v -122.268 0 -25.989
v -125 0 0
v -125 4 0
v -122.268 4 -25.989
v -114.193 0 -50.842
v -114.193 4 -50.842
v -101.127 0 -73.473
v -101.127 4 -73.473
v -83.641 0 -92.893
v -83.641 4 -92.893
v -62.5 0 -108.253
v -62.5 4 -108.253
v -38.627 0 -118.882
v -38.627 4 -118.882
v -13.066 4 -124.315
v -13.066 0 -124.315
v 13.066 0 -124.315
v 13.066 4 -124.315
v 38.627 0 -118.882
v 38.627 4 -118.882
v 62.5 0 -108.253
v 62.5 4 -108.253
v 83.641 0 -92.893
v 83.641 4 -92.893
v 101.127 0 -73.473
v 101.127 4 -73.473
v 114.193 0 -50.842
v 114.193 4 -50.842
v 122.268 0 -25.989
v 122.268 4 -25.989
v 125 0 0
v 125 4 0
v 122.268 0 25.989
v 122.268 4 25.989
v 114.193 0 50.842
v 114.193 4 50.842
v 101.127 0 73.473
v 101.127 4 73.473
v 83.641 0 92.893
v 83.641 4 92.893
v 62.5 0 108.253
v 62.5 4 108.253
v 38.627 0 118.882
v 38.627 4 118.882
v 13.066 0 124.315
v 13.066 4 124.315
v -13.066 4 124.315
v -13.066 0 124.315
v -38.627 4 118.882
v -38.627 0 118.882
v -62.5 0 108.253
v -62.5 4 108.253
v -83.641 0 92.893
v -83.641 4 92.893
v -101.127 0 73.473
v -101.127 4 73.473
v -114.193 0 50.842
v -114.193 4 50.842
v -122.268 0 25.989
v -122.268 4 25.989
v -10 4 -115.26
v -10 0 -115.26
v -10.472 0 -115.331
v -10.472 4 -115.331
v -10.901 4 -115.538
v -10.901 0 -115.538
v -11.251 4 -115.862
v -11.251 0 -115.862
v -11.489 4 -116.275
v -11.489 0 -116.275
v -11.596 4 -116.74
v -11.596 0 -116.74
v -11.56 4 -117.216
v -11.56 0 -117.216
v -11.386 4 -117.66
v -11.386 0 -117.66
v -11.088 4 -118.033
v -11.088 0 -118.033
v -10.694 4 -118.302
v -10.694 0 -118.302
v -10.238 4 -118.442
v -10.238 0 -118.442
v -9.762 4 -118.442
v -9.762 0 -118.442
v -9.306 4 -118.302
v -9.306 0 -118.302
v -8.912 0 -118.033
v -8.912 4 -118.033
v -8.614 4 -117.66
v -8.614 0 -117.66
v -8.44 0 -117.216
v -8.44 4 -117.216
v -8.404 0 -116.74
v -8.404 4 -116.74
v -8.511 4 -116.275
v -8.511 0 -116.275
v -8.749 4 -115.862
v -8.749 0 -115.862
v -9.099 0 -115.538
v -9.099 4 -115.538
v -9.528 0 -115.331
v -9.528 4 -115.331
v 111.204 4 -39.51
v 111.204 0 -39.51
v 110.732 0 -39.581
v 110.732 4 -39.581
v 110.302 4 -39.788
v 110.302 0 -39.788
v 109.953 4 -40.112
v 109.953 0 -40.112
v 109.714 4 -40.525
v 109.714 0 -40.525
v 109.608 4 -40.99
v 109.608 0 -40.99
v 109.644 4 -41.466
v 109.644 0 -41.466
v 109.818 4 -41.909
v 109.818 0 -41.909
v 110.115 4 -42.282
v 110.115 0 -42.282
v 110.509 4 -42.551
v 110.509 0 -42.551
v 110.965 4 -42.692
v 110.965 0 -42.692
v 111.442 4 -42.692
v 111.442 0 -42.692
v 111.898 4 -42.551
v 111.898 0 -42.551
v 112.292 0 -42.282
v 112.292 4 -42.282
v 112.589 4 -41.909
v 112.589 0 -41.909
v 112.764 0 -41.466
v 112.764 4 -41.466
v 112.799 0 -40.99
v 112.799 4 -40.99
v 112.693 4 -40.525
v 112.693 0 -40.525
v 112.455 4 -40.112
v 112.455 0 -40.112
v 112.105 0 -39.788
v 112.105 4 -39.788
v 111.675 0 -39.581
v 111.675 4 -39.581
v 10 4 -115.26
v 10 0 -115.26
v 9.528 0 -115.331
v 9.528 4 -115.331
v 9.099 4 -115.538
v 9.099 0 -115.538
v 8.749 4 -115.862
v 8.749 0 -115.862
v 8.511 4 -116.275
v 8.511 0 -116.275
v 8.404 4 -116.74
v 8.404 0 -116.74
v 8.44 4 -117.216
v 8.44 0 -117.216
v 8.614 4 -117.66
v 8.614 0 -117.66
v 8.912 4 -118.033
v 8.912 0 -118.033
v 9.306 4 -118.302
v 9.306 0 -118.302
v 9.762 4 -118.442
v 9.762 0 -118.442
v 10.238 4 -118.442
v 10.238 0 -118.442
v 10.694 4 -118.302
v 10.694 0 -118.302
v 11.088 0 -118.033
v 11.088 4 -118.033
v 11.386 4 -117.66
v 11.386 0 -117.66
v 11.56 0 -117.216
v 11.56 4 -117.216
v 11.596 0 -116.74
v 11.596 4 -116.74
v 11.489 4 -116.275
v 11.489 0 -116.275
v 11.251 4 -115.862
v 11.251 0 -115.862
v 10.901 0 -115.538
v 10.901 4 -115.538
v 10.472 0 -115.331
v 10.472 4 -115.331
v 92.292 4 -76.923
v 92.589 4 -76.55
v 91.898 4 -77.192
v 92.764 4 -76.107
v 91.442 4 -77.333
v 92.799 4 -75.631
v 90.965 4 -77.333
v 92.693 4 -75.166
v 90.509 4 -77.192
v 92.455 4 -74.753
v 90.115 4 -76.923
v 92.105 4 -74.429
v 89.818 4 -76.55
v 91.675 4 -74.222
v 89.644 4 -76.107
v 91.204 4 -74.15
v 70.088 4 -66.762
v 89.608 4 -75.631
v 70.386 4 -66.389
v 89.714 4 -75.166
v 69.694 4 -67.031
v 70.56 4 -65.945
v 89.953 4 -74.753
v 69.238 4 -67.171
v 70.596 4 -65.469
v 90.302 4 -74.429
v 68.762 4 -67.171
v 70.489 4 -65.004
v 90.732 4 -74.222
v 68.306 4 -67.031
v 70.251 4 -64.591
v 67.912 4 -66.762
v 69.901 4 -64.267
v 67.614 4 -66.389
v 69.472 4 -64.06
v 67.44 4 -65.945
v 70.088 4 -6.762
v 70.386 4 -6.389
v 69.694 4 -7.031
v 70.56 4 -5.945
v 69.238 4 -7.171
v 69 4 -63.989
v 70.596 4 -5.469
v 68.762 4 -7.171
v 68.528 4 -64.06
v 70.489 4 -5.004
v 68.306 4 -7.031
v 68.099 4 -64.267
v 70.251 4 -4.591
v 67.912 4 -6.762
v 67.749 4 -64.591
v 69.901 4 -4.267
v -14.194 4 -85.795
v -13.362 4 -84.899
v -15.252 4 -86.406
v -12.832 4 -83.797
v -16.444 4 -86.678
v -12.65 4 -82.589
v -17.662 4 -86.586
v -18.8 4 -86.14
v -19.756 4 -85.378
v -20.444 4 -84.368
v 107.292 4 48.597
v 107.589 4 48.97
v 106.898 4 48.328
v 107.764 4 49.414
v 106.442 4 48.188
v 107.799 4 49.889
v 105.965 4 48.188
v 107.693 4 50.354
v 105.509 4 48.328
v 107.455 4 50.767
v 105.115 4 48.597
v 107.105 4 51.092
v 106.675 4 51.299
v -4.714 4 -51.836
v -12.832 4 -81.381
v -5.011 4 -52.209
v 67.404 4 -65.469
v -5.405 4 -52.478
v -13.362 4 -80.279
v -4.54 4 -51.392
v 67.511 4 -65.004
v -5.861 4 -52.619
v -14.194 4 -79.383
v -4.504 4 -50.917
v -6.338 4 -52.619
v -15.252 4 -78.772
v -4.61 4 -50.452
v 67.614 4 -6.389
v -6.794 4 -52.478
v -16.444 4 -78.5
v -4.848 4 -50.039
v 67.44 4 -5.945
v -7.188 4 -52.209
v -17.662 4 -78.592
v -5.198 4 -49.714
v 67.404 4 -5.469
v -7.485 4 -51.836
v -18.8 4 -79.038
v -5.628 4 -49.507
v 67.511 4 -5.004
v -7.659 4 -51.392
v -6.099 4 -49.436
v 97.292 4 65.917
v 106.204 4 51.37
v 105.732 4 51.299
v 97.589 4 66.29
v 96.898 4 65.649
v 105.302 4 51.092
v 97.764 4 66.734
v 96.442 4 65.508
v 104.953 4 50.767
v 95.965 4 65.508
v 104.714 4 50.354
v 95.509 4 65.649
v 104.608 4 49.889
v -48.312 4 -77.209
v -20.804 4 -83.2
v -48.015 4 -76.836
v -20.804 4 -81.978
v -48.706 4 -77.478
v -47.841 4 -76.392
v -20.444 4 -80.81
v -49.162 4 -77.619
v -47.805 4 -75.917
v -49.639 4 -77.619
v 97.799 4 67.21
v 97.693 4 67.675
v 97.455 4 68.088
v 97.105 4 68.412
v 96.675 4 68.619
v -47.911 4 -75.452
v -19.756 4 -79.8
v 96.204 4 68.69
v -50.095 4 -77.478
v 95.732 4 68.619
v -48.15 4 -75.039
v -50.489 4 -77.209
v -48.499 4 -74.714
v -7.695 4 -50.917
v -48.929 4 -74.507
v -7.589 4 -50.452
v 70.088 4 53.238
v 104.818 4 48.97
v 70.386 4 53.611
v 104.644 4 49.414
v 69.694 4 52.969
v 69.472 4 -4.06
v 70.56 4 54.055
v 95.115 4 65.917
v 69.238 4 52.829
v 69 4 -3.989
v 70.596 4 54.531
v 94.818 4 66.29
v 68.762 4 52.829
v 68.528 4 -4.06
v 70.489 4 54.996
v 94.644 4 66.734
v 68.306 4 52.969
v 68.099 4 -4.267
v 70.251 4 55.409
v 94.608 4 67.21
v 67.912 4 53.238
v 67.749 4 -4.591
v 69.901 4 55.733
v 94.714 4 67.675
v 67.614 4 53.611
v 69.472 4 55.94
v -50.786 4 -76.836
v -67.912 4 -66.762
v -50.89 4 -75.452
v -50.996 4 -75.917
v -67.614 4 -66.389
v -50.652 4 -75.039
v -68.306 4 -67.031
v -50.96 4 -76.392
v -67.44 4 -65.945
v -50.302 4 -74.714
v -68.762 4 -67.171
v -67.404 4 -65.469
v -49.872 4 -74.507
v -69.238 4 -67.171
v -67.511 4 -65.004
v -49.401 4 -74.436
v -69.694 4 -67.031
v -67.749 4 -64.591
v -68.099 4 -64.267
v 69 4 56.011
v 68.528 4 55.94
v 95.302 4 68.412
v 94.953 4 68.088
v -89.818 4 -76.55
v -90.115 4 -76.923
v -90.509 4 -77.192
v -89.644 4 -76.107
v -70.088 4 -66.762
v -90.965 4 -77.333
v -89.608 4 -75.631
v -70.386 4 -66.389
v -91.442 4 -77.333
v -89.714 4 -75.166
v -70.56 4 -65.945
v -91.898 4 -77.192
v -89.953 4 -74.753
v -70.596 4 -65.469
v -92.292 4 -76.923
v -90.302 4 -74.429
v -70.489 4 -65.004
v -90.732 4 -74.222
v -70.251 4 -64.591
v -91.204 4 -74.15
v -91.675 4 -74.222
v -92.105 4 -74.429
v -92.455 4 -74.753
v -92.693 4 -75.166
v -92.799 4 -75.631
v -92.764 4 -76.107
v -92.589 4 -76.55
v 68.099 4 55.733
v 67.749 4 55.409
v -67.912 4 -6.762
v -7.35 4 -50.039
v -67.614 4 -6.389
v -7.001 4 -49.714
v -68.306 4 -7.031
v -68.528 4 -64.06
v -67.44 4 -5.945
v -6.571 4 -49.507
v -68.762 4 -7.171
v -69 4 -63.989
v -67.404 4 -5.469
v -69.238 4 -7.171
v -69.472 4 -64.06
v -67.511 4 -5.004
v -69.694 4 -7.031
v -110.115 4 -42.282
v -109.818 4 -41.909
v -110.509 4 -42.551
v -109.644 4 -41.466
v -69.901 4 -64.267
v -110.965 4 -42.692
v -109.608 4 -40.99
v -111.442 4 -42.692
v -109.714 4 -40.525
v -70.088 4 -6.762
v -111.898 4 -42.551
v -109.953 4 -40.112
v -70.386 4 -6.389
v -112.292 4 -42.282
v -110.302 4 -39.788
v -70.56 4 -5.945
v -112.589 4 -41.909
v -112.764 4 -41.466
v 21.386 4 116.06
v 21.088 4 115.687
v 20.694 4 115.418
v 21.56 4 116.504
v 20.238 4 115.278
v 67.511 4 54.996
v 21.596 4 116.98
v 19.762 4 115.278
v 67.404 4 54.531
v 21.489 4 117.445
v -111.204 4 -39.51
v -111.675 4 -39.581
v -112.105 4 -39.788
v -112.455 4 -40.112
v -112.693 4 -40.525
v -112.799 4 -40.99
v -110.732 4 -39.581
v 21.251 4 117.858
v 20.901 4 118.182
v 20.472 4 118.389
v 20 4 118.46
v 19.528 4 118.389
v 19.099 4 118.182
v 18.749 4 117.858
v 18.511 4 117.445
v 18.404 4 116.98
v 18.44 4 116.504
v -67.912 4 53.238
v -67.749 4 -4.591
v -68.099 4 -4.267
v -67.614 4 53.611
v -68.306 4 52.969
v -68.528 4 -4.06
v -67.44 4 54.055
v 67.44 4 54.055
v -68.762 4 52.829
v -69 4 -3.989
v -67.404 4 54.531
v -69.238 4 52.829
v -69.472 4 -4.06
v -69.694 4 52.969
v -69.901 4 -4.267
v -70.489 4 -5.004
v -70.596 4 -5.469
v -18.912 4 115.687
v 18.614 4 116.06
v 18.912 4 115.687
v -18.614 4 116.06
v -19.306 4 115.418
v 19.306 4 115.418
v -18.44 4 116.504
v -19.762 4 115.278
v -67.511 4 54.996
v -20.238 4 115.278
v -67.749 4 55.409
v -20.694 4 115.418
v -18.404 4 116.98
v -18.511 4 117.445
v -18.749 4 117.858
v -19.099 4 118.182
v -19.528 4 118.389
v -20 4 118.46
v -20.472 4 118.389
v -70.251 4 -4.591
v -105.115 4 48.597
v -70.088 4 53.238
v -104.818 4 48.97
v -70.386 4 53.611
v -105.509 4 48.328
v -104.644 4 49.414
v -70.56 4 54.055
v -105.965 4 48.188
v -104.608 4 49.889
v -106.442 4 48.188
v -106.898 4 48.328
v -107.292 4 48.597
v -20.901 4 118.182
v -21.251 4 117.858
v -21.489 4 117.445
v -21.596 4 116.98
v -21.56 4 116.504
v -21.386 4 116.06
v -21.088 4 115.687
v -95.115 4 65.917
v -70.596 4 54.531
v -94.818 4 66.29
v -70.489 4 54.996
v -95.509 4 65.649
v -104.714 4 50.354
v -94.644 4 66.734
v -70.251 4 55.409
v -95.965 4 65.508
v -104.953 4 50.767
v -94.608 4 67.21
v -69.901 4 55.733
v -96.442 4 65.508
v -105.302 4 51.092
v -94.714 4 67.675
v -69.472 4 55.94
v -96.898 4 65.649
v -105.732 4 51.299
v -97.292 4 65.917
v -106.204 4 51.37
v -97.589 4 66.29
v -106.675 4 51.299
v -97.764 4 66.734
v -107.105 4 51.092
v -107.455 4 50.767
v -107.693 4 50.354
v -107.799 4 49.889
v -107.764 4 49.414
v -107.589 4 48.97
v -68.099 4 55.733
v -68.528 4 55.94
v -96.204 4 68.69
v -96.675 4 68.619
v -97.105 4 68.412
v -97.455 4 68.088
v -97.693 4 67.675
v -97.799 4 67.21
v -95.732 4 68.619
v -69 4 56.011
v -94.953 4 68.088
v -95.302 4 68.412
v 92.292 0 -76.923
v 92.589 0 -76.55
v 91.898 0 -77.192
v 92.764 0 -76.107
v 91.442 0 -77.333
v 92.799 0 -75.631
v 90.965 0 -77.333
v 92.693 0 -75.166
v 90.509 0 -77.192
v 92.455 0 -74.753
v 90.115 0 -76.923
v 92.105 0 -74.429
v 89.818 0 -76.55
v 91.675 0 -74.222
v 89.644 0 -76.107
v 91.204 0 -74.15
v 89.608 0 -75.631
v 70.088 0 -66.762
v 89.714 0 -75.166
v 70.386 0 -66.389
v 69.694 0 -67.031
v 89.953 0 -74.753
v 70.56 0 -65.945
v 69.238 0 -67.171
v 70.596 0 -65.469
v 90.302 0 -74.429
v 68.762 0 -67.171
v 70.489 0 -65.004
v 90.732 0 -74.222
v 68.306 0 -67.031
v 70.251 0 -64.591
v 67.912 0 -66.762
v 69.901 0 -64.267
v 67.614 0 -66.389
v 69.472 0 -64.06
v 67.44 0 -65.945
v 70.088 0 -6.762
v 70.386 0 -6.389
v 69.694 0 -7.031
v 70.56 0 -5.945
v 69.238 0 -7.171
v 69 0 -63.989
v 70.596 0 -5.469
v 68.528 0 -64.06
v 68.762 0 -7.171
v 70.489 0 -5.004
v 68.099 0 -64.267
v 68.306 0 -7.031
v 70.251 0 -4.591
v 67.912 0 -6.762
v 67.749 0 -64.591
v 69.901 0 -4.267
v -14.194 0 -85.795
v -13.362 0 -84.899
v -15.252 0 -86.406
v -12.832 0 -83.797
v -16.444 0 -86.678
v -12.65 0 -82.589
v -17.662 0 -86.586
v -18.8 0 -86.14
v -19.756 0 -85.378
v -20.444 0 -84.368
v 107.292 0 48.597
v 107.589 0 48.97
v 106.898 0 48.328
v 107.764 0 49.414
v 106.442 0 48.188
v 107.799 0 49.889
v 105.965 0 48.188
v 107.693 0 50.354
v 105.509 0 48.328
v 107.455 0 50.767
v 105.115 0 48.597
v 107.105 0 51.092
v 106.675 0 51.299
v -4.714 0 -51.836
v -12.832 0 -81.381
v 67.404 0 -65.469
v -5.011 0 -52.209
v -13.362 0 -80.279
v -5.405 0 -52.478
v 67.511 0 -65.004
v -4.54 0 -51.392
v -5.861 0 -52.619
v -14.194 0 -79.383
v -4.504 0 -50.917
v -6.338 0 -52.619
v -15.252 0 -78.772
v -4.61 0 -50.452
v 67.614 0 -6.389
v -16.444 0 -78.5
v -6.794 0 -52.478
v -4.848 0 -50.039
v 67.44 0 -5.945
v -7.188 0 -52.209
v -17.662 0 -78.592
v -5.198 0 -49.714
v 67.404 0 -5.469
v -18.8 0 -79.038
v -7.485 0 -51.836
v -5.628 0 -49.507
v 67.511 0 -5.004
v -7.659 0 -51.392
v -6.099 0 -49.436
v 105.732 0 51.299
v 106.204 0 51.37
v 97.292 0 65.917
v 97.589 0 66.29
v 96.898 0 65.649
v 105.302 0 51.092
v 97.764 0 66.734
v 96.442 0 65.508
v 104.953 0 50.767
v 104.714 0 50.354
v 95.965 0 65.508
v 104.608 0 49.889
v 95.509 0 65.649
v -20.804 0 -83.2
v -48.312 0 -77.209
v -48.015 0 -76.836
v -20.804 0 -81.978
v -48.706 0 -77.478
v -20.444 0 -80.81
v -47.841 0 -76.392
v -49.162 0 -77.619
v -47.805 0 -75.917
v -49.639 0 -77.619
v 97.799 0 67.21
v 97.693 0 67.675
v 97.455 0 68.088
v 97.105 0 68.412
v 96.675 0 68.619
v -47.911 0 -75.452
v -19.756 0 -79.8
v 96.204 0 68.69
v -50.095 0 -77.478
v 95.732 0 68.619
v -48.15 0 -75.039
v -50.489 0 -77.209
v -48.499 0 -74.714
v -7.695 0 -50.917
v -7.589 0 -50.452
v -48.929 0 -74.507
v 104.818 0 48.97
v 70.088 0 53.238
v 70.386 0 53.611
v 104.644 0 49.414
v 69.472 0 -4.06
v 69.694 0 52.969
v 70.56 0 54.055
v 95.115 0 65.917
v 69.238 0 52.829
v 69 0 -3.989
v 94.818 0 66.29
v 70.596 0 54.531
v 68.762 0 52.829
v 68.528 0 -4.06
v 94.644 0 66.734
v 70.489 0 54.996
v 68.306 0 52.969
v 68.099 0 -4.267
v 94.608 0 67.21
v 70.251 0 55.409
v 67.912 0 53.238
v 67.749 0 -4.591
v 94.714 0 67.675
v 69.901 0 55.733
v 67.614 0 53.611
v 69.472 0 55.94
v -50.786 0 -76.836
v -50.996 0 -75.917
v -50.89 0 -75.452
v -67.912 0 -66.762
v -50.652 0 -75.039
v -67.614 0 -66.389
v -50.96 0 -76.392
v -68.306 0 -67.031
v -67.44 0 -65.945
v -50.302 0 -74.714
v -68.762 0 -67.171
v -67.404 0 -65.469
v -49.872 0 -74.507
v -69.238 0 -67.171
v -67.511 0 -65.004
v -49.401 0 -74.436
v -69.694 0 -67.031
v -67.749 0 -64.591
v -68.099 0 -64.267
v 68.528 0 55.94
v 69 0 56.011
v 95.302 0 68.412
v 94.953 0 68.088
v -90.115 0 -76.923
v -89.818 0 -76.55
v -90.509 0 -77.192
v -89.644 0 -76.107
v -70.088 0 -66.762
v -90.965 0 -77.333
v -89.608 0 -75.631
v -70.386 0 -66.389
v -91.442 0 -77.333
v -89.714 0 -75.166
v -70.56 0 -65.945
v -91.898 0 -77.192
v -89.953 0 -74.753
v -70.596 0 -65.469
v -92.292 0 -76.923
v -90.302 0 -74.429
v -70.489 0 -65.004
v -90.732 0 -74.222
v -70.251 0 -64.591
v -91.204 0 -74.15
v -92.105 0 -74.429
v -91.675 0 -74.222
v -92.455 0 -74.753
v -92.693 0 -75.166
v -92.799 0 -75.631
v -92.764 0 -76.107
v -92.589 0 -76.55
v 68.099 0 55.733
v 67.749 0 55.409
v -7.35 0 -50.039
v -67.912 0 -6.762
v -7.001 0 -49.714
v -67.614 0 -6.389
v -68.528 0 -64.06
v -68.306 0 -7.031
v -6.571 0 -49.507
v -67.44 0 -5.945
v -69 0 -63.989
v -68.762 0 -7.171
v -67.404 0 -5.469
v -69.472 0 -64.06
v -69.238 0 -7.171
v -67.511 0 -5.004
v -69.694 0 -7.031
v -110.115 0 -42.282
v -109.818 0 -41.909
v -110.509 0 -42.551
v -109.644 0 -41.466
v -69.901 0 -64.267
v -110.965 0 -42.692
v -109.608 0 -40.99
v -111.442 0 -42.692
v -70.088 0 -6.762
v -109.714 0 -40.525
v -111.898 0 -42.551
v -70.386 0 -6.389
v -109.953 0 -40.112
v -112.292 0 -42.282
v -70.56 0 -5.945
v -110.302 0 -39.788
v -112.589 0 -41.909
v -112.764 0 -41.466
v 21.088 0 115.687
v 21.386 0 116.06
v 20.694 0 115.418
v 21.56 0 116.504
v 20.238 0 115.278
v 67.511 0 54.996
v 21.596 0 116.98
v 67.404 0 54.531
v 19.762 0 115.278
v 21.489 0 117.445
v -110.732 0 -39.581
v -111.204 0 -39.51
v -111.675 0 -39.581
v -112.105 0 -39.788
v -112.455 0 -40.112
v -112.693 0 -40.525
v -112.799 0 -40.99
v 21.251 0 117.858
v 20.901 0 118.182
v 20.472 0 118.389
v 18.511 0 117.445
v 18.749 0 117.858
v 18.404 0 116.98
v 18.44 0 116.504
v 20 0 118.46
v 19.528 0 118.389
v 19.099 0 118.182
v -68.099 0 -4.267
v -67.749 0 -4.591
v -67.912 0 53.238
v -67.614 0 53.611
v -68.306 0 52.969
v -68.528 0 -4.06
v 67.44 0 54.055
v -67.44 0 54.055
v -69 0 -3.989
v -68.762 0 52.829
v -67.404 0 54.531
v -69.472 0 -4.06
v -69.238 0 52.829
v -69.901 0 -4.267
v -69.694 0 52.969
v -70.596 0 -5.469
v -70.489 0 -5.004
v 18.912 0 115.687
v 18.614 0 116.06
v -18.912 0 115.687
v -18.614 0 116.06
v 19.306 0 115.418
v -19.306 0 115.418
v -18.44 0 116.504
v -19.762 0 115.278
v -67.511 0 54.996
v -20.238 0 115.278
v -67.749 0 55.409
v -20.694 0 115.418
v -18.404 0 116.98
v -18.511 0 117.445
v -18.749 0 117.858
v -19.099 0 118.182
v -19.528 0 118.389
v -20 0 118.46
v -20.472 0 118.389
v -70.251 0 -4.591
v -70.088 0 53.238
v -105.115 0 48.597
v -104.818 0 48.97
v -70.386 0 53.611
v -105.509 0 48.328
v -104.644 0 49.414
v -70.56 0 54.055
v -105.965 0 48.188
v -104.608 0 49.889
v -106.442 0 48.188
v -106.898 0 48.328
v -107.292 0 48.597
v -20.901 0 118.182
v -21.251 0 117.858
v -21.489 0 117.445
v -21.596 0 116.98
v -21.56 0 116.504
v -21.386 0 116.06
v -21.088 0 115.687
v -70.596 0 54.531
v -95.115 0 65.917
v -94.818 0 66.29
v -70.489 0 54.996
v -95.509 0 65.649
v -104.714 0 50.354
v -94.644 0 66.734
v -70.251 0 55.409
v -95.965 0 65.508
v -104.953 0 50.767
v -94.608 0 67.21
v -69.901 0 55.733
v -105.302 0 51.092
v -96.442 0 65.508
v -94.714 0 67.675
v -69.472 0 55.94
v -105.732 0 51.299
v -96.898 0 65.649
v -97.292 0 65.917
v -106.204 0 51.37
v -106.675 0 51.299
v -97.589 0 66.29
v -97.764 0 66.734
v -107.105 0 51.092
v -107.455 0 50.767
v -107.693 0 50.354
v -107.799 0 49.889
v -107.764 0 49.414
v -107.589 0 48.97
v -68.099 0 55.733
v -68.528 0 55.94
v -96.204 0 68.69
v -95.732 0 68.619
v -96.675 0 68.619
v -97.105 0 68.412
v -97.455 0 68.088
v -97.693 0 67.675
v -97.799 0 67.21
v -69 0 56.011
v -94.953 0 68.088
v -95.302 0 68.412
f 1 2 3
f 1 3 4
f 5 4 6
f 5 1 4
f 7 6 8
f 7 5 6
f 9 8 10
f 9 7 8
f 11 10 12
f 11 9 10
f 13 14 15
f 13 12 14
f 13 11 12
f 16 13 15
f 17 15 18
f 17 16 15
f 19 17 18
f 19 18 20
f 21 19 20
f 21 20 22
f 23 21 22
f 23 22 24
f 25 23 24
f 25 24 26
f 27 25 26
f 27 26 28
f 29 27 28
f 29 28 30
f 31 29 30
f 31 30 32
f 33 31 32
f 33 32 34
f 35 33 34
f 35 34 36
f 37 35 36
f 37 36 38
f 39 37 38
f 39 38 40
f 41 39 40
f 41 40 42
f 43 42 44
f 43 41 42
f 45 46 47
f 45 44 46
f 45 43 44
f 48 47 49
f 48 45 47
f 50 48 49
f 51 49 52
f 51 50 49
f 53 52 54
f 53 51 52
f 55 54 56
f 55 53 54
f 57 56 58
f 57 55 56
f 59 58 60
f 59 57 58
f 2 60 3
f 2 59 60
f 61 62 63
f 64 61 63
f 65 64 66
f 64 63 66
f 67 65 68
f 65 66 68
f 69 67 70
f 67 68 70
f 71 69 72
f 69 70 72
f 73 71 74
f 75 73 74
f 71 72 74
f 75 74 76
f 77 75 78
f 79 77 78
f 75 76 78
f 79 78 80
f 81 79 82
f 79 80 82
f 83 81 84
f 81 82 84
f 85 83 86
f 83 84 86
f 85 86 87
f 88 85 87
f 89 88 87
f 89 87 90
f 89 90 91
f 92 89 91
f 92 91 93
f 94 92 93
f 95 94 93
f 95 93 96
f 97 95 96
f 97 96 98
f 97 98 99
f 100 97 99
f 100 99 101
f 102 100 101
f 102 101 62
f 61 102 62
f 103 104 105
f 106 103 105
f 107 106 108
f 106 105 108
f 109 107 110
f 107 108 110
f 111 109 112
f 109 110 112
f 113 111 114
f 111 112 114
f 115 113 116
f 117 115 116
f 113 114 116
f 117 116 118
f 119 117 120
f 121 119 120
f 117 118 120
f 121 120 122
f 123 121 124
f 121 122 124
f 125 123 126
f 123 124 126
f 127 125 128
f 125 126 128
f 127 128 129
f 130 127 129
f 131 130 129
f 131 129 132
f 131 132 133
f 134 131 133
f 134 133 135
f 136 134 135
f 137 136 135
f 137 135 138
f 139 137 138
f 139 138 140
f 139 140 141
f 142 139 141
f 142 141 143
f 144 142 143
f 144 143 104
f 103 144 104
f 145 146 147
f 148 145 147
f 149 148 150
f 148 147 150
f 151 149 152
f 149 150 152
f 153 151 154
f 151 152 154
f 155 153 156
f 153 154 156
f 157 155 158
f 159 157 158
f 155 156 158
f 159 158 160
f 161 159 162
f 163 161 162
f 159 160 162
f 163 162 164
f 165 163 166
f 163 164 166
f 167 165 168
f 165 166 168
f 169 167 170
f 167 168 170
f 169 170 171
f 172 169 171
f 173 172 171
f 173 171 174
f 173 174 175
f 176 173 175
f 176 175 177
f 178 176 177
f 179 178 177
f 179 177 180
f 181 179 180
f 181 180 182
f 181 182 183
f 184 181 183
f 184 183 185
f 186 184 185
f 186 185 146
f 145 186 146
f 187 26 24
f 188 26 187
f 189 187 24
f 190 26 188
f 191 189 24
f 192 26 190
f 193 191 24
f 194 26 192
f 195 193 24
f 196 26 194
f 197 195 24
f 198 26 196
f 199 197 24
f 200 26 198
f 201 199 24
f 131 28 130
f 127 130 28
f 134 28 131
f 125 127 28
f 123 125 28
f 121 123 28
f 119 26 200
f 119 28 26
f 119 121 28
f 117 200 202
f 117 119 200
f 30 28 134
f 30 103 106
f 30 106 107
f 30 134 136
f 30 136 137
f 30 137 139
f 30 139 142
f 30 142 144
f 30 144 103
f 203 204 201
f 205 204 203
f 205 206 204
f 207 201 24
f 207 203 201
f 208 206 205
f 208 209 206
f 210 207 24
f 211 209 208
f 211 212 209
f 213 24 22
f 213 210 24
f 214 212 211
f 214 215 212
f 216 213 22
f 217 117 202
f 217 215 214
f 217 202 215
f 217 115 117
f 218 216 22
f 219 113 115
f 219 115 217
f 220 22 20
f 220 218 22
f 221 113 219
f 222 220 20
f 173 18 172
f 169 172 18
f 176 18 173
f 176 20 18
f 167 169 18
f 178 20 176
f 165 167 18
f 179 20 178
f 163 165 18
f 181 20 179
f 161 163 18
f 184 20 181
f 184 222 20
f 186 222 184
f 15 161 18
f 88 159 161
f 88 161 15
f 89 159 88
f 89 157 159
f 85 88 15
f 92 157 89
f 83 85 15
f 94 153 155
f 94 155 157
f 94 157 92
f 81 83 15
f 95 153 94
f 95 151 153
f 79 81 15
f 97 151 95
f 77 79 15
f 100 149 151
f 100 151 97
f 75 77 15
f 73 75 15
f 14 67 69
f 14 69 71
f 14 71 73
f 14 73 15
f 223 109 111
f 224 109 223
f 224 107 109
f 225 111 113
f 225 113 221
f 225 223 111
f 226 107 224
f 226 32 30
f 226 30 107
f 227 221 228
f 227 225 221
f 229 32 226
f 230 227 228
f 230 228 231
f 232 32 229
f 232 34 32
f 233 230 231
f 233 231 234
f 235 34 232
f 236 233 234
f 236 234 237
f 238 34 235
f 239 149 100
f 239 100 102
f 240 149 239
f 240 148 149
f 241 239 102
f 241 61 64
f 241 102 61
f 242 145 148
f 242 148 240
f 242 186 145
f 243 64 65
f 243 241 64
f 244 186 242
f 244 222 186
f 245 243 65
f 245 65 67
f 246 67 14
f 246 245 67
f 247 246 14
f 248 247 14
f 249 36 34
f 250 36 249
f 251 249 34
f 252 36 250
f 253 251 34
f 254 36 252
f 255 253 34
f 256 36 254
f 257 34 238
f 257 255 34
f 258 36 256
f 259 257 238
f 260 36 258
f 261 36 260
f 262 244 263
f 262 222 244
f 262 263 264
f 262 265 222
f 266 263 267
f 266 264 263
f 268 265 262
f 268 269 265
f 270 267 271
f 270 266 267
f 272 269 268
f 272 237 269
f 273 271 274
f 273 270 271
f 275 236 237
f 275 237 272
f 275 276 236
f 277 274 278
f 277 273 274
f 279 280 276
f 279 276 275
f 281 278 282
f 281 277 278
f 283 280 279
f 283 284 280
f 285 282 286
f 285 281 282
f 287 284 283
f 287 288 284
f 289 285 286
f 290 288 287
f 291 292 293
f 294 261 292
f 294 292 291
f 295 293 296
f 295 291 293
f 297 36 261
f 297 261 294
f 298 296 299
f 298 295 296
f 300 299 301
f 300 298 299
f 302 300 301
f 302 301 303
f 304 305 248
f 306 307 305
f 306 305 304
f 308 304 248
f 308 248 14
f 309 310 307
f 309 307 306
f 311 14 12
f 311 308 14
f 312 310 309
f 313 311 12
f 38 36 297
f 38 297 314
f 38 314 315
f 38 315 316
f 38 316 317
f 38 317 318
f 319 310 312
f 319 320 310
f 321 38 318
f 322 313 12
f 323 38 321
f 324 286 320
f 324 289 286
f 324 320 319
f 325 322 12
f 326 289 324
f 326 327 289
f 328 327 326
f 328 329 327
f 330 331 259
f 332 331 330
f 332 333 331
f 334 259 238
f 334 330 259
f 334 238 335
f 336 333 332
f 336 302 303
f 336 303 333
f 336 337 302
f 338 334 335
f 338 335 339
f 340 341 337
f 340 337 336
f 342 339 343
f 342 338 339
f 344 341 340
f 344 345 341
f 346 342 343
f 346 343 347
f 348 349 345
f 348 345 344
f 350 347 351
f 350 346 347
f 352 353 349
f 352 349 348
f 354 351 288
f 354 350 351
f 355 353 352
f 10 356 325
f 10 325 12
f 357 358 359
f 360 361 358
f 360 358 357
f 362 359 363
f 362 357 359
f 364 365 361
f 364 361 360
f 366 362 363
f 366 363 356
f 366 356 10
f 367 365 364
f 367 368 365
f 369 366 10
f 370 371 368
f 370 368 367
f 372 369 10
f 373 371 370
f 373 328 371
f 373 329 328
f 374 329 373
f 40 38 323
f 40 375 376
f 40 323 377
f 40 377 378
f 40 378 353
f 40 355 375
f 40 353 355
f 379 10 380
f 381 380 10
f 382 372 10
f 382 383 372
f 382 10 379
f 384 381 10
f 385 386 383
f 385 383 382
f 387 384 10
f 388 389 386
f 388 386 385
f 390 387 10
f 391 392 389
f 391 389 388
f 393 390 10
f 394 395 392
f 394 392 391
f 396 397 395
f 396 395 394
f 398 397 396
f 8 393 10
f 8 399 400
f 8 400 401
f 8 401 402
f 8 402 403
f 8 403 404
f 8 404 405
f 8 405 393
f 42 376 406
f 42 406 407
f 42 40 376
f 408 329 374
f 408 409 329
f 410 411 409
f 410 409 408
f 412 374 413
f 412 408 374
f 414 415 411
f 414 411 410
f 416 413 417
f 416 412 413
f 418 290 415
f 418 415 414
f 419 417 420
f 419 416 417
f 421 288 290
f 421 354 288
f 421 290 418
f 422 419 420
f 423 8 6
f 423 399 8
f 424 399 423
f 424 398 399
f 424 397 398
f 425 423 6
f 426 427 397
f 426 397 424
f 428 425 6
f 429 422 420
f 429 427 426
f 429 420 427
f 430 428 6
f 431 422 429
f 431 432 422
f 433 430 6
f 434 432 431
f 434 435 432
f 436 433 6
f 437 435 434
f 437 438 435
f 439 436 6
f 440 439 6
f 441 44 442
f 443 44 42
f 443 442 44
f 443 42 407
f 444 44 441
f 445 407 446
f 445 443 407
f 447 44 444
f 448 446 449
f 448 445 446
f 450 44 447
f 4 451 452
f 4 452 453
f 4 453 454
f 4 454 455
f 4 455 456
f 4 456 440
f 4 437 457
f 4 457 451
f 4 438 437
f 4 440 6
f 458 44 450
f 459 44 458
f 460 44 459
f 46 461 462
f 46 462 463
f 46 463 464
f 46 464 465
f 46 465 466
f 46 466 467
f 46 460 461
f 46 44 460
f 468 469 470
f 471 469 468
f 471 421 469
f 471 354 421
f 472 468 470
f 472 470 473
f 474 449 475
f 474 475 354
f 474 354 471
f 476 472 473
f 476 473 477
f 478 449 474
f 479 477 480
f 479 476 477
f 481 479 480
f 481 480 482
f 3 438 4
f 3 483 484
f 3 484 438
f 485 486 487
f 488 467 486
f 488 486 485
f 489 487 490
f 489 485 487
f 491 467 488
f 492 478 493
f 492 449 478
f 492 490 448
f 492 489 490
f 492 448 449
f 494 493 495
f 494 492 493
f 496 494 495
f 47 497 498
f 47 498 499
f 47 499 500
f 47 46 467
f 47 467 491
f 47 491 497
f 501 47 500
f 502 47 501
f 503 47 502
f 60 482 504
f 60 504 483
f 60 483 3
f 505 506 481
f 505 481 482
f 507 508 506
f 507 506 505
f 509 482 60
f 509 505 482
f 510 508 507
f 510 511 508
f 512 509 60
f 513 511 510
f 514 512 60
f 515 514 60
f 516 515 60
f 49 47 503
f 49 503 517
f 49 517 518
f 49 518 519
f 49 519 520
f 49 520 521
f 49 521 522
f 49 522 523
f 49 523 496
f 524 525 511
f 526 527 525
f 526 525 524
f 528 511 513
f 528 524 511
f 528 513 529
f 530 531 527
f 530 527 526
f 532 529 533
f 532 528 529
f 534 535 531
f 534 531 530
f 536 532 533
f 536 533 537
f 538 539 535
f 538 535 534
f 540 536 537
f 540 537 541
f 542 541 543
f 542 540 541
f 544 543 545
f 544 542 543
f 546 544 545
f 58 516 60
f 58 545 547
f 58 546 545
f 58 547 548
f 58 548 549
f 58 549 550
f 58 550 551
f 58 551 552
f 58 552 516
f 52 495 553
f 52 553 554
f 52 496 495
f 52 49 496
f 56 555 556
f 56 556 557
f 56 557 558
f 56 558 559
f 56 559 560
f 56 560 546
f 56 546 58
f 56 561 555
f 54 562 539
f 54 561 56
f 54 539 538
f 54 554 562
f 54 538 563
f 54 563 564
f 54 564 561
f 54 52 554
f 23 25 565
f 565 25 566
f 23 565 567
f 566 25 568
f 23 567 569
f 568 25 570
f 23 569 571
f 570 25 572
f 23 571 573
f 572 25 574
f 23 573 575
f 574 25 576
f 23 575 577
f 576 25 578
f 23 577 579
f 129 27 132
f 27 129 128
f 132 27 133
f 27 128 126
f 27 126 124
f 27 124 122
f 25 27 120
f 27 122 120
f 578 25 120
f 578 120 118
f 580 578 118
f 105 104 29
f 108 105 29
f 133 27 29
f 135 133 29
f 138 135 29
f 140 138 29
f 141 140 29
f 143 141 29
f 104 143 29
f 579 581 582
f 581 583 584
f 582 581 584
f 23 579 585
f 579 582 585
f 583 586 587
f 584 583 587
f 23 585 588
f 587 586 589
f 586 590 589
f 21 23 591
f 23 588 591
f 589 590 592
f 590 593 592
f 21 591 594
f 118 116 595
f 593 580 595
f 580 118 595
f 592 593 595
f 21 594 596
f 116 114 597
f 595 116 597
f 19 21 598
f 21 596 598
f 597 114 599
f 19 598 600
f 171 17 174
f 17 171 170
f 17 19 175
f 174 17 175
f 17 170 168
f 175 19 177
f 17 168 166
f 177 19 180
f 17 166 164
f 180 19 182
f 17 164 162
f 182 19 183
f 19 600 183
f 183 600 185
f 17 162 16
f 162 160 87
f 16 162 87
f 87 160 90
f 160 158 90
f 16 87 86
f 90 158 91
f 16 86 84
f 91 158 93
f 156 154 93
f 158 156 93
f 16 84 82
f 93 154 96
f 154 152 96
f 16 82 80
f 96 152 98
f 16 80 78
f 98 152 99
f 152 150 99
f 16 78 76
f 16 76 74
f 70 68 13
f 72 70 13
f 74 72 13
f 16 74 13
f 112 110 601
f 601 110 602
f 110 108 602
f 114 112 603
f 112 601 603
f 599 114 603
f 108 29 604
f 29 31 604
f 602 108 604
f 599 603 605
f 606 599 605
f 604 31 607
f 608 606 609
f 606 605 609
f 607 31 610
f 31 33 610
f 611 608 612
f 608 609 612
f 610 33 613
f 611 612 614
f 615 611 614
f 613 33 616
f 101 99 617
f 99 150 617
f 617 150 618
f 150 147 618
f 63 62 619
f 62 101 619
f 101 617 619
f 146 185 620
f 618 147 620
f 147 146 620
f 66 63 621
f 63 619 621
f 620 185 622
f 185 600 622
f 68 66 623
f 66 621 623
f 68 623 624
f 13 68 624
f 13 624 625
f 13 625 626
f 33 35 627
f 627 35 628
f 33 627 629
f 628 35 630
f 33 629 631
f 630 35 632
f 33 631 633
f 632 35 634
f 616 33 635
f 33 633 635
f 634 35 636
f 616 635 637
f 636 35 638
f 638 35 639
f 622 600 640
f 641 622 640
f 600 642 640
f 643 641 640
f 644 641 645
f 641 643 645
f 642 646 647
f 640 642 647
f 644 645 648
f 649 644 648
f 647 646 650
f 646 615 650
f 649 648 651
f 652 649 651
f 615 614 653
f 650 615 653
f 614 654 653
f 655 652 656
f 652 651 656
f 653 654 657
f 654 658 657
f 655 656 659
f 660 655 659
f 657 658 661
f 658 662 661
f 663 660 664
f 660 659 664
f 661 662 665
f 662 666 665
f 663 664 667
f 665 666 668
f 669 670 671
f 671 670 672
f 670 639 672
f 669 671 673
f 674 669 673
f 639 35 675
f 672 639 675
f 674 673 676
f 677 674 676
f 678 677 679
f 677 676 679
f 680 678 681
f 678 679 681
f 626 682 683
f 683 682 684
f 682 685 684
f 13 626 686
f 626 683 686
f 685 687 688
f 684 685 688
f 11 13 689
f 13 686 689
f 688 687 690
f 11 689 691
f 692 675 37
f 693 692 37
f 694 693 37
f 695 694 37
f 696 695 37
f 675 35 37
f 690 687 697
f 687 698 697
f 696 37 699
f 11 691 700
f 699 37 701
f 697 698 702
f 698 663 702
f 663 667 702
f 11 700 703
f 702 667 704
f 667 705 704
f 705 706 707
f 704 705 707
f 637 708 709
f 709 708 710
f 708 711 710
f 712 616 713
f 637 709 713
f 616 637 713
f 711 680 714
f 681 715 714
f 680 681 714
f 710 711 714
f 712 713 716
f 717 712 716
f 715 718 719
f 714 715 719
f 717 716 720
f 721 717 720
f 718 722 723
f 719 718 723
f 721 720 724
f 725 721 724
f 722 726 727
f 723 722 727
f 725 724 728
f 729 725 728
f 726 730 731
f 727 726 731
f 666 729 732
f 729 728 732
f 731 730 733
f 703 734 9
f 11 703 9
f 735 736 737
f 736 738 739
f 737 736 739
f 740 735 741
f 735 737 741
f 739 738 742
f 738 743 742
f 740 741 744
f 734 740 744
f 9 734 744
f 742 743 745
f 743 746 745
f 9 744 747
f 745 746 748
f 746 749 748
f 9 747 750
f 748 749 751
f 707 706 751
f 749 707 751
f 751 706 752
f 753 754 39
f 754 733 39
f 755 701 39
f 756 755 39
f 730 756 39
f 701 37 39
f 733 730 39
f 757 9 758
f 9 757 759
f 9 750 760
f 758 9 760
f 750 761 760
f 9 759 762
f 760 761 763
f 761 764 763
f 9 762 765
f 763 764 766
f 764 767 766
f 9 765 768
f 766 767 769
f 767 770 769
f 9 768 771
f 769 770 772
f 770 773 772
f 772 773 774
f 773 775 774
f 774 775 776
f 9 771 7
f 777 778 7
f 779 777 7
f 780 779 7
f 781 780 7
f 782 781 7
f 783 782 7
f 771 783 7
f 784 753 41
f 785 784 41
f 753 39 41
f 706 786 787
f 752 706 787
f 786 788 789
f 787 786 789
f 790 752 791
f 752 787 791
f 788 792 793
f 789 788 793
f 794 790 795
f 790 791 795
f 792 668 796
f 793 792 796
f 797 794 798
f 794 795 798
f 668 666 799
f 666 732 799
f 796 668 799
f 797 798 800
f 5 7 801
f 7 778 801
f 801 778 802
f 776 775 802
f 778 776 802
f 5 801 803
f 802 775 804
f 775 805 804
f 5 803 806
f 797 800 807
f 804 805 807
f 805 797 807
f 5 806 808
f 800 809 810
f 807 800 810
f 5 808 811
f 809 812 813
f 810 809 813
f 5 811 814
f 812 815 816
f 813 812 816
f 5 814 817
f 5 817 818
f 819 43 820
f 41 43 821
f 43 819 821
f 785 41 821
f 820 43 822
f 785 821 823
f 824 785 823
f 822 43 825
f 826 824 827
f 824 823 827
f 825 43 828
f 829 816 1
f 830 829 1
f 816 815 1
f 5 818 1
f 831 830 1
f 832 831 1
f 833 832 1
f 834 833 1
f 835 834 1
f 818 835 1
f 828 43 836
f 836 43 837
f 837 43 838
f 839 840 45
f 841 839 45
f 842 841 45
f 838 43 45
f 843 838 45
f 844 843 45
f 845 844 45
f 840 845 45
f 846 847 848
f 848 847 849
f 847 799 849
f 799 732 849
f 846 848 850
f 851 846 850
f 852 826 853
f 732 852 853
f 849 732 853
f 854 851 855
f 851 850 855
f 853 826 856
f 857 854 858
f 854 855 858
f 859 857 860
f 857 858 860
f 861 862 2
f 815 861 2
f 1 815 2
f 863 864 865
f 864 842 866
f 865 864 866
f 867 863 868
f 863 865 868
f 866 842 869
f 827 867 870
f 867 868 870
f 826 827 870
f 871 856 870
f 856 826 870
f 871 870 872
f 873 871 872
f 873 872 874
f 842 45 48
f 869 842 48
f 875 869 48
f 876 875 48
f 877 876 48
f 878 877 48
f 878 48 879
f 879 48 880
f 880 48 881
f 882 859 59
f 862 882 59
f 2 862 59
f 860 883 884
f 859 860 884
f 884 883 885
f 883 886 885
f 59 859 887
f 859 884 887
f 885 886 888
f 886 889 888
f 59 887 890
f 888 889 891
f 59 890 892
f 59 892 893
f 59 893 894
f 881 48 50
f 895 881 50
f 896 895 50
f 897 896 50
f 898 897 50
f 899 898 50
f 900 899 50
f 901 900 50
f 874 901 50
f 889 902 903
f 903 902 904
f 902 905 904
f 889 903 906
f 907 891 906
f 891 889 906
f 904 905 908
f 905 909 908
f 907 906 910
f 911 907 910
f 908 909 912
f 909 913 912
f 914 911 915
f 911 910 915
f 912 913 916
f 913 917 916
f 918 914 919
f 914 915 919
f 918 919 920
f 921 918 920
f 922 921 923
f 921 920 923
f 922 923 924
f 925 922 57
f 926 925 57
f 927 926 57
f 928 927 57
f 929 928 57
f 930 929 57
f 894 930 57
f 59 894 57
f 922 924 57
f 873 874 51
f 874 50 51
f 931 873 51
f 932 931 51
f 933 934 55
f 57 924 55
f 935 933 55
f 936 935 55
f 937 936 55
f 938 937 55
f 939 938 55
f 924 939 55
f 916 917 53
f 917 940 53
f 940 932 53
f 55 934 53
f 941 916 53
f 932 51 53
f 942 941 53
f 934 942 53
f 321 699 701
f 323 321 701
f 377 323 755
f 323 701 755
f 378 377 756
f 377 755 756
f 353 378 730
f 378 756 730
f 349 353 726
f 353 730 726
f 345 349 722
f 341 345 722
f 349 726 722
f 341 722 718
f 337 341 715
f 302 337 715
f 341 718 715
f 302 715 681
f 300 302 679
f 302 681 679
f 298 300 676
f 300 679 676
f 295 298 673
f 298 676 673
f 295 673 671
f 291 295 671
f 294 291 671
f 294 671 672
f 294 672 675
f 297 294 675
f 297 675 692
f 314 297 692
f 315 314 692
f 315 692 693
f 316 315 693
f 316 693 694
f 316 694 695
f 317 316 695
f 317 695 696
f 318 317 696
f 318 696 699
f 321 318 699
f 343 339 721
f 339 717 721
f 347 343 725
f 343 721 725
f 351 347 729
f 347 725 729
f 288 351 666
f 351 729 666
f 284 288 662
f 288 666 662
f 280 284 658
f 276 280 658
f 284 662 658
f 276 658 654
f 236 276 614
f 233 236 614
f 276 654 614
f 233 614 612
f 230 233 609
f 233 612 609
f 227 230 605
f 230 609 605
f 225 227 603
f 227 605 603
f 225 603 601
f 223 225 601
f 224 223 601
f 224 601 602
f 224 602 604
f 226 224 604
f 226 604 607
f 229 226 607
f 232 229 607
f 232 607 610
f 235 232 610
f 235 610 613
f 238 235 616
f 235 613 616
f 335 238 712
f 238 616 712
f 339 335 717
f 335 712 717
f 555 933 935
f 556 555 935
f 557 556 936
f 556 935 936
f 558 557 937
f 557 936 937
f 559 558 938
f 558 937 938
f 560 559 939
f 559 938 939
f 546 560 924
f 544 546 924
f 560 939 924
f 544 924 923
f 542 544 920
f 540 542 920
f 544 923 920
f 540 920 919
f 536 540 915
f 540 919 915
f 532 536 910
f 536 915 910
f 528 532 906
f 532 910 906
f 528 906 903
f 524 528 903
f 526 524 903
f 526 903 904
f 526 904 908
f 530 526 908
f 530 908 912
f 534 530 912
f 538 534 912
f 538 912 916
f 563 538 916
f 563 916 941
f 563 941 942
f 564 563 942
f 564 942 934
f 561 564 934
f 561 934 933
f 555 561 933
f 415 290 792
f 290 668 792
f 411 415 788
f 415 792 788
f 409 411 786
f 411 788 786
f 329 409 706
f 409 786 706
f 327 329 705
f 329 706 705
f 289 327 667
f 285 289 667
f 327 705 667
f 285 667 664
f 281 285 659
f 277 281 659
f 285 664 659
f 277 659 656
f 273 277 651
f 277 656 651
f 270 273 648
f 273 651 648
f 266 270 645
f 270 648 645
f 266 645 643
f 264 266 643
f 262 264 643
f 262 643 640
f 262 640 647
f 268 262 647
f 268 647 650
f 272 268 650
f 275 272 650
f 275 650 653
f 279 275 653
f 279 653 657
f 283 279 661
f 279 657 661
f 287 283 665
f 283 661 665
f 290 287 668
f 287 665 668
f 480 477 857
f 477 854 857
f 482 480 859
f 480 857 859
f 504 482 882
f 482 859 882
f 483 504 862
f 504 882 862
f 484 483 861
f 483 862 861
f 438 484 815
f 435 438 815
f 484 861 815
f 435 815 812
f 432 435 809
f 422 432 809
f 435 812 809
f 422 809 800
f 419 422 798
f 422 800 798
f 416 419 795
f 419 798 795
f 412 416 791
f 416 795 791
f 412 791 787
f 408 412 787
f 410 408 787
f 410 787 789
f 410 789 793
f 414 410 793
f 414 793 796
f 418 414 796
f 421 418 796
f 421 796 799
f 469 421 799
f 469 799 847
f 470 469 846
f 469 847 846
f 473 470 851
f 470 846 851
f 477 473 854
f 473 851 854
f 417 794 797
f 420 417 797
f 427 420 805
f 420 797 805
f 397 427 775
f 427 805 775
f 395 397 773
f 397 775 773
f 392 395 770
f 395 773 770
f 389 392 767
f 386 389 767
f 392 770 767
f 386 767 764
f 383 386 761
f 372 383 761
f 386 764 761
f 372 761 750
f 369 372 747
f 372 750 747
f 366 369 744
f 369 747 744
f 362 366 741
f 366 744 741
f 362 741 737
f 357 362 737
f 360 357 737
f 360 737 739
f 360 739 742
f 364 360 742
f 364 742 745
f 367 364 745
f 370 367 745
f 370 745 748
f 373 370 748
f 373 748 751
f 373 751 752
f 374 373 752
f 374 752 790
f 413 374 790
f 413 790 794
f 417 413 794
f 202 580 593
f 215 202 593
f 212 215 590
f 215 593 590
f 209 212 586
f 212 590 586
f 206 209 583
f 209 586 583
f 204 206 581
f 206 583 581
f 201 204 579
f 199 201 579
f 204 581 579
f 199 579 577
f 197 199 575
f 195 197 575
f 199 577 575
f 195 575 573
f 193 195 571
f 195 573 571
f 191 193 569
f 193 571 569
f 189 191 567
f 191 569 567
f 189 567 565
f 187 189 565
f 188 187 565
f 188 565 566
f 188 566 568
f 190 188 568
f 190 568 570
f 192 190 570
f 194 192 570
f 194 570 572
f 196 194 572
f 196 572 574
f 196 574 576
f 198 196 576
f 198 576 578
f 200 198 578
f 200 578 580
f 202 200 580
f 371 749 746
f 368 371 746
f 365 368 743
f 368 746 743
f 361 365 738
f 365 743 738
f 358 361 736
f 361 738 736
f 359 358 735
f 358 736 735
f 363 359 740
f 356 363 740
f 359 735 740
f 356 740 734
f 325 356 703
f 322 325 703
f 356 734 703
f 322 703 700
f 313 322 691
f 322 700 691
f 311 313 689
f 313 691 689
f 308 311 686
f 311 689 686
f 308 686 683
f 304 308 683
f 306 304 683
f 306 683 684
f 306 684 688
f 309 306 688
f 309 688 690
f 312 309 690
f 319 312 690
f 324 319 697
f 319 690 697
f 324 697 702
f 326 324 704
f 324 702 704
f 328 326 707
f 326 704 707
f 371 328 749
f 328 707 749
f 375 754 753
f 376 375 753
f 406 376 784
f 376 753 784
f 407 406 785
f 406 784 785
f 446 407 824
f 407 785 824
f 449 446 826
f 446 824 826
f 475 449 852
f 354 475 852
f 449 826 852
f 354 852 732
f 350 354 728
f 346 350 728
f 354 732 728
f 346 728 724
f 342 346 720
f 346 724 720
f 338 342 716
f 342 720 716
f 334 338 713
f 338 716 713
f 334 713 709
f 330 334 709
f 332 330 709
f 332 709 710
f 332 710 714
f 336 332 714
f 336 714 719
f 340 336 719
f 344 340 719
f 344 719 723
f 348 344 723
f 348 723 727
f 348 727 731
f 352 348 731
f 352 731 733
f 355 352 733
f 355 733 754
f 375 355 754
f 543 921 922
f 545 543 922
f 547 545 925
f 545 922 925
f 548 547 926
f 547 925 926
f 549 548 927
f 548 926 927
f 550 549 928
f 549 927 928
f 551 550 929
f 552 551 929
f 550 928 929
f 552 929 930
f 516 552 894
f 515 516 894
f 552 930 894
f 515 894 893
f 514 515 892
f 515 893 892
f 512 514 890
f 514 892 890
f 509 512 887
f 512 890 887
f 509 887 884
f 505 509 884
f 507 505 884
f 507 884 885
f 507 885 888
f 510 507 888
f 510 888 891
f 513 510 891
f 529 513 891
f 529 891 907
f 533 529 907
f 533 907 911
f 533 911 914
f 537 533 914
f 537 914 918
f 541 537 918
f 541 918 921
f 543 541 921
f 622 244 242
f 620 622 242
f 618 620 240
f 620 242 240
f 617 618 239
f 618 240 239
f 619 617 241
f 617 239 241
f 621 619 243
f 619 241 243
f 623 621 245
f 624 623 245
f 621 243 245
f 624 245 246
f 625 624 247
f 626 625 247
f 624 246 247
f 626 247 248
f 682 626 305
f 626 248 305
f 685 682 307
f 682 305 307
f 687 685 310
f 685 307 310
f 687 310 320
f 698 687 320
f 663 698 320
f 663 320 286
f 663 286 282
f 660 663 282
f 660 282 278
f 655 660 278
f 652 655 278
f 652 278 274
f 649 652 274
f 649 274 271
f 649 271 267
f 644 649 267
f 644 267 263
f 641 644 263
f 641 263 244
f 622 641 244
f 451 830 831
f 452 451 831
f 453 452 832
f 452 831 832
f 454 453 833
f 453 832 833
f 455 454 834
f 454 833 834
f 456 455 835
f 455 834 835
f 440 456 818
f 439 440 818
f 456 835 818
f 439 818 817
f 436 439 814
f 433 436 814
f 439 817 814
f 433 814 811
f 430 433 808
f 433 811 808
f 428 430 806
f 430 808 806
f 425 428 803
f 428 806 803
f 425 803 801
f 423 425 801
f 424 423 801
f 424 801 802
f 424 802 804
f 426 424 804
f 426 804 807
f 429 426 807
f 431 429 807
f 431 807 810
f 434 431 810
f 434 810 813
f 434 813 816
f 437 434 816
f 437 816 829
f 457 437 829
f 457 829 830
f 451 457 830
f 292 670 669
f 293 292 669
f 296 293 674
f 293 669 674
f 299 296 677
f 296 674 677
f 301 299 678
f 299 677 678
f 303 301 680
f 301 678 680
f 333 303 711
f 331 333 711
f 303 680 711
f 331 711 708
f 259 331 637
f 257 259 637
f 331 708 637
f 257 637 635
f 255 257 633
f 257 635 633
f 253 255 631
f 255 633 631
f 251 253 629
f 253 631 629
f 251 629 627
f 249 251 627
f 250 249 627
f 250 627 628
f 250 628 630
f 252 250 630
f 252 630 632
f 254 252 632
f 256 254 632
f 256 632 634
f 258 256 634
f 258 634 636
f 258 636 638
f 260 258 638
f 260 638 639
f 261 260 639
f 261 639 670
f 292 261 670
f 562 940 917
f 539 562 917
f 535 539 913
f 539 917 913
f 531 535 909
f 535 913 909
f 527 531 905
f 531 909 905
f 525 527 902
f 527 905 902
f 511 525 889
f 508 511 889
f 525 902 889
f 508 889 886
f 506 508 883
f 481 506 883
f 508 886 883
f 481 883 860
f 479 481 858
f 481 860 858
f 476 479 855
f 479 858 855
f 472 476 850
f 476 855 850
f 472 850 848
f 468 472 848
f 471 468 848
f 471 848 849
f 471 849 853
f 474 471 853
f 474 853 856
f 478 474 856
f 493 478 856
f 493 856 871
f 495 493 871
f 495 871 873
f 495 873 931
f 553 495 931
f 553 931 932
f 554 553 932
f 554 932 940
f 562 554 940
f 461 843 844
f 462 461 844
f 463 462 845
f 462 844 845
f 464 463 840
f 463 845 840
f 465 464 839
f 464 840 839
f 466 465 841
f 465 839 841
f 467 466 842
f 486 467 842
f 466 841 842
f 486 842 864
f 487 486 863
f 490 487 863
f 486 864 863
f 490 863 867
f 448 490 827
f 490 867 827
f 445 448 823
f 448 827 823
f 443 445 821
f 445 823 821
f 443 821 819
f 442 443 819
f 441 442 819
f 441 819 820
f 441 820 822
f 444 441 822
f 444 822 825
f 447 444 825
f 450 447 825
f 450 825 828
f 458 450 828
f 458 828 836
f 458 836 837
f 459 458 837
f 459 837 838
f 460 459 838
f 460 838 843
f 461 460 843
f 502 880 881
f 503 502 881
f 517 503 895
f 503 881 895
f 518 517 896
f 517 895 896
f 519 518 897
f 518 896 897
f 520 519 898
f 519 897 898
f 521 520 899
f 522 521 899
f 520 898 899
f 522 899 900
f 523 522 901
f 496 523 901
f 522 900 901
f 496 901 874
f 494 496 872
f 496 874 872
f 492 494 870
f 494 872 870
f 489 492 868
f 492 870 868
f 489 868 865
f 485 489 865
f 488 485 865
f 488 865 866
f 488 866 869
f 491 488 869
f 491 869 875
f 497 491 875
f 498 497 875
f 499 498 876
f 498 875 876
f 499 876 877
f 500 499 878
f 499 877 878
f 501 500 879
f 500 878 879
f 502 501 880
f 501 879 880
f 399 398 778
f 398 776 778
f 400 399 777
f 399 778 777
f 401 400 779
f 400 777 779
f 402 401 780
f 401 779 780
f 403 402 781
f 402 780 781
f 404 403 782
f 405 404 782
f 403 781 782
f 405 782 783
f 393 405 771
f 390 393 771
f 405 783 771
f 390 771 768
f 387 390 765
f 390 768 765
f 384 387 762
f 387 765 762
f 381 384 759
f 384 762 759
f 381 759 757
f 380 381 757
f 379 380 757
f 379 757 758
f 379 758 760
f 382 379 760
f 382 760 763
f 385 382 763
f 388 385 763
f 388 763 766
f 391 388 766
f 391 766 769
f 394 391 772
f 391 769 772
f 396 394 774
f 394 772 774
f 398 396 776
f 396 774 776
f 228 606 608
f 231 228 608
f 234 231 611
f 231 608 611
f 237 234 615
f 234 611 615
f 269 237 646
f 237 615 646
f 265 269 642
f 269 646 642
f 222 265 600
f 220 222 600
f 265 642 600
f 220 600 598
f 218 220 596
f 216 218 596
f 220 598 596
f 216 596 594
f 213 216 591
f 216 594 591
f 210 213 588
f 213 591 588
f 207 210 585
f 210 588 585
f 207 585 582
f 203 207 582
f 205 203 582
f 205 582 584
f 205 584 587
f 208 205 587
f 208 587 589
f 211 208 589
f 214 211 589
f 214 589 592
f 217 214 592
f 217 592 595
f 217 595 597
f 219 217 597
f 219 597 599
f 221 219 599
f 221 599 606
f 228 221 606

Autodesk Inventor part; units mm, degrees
ref_plane "YZ Plane" through (0, 0, 0) normal (1, 0, 0) x (0, 1, 0)
ref_plane "XZ Plane" through (0, 0, 0) normal (0, 1, 0) x (-1, 0, 0)
ref_plane "XY Plane" through (0, 0, 0) normal (0, 0, 1) x (1, 0, 0)
sketch "スケッチ1" plane through (0, 0, 0) normal (0, 1, 0) x (-1, 0, 0)
  circle A0 centre (0, 0) radius 125
  dimension "d0" = 250
extrude "押し出し1" add sketch "スケッチ1" along normal blind 4
sketch "スケッチ2" plane through (0, 4, 0) normal (0, 1, 0) x (1, 0, 0)
  line L0 (75, -84.411) -> (-75, -84.411)
  line L1 (-75, -84.411) -> (-75, 95.589)
  line L2 (-75, 95.589) -> (75, 95.589)
  line L3 (75, 95.589) -> (75, -84.411)
  line L4 (75, -84.411) -> (-75, 95.589) construction
  line L5 (-75, -84.411) -> (75, 95.589) construction
  circle A0 centre (0, 0) radius 121.5
  line L6 (0, 0) -> (0, -125) construction
  circle A1 centre (0, 0) radius 125 projected
  line L7 (0, 0) -> (108.2532, 62.5) construction
  line L8 (0, 0) -> (-108.2532, 62.5) construction
  circle A2 centre (-16.75, 82.589) radius 4.1
  point P0 (0, 5.589)
  dimension "d3" = 150
  dimension "d4" = 180
  dimension "d5" = 243
  dimension "d8" = 360
  dimension "d12" = 16.75
  dimension "d13" = 13
  dimension "d14" = 8.2
extrude "押し出し2" cut sketch "スケッチ2" against normal blind 4 contours A2
sketch "スケッチ4" plane through (0, 4, 0) normal (0, 1, 0) x (1, 0, 0)
  circle A0 centre (0, 0) radius 121.5
  line L0 (75, -84.411) -> (-75, -84.411)
  line L1 (-75, -84.411) -> (-75, 95.589)
  line L2 (-75, 95.589) -> (75, 95.589)
  line L3 (75, 95.589) -> (75, -84.411)
  line L4 (75, -84.411) -> (-75, 95.589) construction
  line L5 (-75, -84.411) -> (75, 95.589) construction
  line L6 (0, 0) -> (0, -29.9183)
  point P0 (0, 5.589)
  point P1 (69, -54.411)
  point P2 (69, 5.589)
  point P3 (69, 65.589)
  point P4 (-69, -54.411)
  point P5 (-69, 5.589)
  point P6 (-69, 65.589)
  dimension "d17" = 243
  dimension "d18" = 150
  dimension "d19" = 180
  dimension "d20" = 30
  dimension "d21" = 6
  dimension "d22" = 60
  dimension "d23" = 60
hole "穴1" at (69, 4, 54.411) at (69, 4, -5.589) at (69, 4, -65.589) at (-69, 4, -65.589) at (-69, 4, -5.589) at (-69, 4, 54.411) direction (0, -1, 0) diameter 3.2 end through all
sketch "スケッチ5" plane through (0, 4, 0) normal (0, 1, 0) x (1, 0, 0)
  point P0 (0, 0)
  point P1 (0, -116.86)
  point P2 (20, -116.86)
  point P3 (-20, -116.86)
  point P4 (111.2037, 41.1095)
  point P5 (91.2037, 75.7505)
  point P6 (101.2037, 58.43)
  point P7 (-91.2037, 75.7505)
  point P8 (-111.2037, 41.1095)
  point P9 (-101.2037, 58.43)
  dimension "d31" = 116.86
  dimension "d32" = 20
  dimension "d33" = 20
  dimension "d36" = 360
hole "穴2" at (20, 4, 116.86) at (-20, 4, 116.86) at (111.2037, 4, -41.1095) at (91.2037, 4, -75.7505) at (-91.2037, 4, -75.7505) at (-111.2037, 4, -41.1095) direction (0, -1, 0) diameter 3.2 depth 10
sketch "スケッチ6" plane through (0, 4, 0) normal (0, 1, 0) x (1, 0, 0)
  point P0 (0, 0)
  point P1 (0, 116.86)
  point P2 (-10, 116.86)
  point P3 (10, 116.86)
  point P4 (-106.2037, -49.7697)
  point P5 (-96.2037, -67.0903)
  point P6 (-101.2037, -58.43)
  point P7 (96.2037, -67.0903)
  point P8 (106.2037, -49.7697)
  point P9 (101.2037, -58.43)
  dimension "d45" = 116.86
  dimension "d46" = 10
  dimension "d47" = 10
  dimension "d50" = 360
hole "穴3" at (-10, 4, -116.86) at (10, 4, -116.86) at (-106.2037, 4, 49.7697) at (-96.2037, 4, 67.0903) at (96.2037, 4, 67.0903) at (106.2037, 4, 49.7697) direction (0, -1, 0) diameter 3.2 depth 10
sketch "スケッチ7" plane through (0, 4, 0) normal (0, 1, 0) x (1, 0, 0)
  circle A0 centre (-16.75, 82.589) radius 4.1 projected
  line L0 (-16.75, 82.589) -> (-27.75, 63.5364) construction
  line L1 (-16.75, 82.589) -> (5.25, 82.589) construction
  line L2 (-27.75, 63.5364) -> (-49.4006, 76.0364)
  line L3 (-49.4006, 76.0364) -> (-6.0994, 51.0364) construction
  point P0 (0, 0)
  dimension "d59" = 22
  dimension "d60" = 120
  dimension "d61" = 25
  dimension "d62" = 50
hole "穴4" at (-49.4006, 4, -76.0364) at (-6.0994, 4, -51.0364) direction (0, -1, 0) diameter 3.2 depth 10
properties part number "中間台1"
